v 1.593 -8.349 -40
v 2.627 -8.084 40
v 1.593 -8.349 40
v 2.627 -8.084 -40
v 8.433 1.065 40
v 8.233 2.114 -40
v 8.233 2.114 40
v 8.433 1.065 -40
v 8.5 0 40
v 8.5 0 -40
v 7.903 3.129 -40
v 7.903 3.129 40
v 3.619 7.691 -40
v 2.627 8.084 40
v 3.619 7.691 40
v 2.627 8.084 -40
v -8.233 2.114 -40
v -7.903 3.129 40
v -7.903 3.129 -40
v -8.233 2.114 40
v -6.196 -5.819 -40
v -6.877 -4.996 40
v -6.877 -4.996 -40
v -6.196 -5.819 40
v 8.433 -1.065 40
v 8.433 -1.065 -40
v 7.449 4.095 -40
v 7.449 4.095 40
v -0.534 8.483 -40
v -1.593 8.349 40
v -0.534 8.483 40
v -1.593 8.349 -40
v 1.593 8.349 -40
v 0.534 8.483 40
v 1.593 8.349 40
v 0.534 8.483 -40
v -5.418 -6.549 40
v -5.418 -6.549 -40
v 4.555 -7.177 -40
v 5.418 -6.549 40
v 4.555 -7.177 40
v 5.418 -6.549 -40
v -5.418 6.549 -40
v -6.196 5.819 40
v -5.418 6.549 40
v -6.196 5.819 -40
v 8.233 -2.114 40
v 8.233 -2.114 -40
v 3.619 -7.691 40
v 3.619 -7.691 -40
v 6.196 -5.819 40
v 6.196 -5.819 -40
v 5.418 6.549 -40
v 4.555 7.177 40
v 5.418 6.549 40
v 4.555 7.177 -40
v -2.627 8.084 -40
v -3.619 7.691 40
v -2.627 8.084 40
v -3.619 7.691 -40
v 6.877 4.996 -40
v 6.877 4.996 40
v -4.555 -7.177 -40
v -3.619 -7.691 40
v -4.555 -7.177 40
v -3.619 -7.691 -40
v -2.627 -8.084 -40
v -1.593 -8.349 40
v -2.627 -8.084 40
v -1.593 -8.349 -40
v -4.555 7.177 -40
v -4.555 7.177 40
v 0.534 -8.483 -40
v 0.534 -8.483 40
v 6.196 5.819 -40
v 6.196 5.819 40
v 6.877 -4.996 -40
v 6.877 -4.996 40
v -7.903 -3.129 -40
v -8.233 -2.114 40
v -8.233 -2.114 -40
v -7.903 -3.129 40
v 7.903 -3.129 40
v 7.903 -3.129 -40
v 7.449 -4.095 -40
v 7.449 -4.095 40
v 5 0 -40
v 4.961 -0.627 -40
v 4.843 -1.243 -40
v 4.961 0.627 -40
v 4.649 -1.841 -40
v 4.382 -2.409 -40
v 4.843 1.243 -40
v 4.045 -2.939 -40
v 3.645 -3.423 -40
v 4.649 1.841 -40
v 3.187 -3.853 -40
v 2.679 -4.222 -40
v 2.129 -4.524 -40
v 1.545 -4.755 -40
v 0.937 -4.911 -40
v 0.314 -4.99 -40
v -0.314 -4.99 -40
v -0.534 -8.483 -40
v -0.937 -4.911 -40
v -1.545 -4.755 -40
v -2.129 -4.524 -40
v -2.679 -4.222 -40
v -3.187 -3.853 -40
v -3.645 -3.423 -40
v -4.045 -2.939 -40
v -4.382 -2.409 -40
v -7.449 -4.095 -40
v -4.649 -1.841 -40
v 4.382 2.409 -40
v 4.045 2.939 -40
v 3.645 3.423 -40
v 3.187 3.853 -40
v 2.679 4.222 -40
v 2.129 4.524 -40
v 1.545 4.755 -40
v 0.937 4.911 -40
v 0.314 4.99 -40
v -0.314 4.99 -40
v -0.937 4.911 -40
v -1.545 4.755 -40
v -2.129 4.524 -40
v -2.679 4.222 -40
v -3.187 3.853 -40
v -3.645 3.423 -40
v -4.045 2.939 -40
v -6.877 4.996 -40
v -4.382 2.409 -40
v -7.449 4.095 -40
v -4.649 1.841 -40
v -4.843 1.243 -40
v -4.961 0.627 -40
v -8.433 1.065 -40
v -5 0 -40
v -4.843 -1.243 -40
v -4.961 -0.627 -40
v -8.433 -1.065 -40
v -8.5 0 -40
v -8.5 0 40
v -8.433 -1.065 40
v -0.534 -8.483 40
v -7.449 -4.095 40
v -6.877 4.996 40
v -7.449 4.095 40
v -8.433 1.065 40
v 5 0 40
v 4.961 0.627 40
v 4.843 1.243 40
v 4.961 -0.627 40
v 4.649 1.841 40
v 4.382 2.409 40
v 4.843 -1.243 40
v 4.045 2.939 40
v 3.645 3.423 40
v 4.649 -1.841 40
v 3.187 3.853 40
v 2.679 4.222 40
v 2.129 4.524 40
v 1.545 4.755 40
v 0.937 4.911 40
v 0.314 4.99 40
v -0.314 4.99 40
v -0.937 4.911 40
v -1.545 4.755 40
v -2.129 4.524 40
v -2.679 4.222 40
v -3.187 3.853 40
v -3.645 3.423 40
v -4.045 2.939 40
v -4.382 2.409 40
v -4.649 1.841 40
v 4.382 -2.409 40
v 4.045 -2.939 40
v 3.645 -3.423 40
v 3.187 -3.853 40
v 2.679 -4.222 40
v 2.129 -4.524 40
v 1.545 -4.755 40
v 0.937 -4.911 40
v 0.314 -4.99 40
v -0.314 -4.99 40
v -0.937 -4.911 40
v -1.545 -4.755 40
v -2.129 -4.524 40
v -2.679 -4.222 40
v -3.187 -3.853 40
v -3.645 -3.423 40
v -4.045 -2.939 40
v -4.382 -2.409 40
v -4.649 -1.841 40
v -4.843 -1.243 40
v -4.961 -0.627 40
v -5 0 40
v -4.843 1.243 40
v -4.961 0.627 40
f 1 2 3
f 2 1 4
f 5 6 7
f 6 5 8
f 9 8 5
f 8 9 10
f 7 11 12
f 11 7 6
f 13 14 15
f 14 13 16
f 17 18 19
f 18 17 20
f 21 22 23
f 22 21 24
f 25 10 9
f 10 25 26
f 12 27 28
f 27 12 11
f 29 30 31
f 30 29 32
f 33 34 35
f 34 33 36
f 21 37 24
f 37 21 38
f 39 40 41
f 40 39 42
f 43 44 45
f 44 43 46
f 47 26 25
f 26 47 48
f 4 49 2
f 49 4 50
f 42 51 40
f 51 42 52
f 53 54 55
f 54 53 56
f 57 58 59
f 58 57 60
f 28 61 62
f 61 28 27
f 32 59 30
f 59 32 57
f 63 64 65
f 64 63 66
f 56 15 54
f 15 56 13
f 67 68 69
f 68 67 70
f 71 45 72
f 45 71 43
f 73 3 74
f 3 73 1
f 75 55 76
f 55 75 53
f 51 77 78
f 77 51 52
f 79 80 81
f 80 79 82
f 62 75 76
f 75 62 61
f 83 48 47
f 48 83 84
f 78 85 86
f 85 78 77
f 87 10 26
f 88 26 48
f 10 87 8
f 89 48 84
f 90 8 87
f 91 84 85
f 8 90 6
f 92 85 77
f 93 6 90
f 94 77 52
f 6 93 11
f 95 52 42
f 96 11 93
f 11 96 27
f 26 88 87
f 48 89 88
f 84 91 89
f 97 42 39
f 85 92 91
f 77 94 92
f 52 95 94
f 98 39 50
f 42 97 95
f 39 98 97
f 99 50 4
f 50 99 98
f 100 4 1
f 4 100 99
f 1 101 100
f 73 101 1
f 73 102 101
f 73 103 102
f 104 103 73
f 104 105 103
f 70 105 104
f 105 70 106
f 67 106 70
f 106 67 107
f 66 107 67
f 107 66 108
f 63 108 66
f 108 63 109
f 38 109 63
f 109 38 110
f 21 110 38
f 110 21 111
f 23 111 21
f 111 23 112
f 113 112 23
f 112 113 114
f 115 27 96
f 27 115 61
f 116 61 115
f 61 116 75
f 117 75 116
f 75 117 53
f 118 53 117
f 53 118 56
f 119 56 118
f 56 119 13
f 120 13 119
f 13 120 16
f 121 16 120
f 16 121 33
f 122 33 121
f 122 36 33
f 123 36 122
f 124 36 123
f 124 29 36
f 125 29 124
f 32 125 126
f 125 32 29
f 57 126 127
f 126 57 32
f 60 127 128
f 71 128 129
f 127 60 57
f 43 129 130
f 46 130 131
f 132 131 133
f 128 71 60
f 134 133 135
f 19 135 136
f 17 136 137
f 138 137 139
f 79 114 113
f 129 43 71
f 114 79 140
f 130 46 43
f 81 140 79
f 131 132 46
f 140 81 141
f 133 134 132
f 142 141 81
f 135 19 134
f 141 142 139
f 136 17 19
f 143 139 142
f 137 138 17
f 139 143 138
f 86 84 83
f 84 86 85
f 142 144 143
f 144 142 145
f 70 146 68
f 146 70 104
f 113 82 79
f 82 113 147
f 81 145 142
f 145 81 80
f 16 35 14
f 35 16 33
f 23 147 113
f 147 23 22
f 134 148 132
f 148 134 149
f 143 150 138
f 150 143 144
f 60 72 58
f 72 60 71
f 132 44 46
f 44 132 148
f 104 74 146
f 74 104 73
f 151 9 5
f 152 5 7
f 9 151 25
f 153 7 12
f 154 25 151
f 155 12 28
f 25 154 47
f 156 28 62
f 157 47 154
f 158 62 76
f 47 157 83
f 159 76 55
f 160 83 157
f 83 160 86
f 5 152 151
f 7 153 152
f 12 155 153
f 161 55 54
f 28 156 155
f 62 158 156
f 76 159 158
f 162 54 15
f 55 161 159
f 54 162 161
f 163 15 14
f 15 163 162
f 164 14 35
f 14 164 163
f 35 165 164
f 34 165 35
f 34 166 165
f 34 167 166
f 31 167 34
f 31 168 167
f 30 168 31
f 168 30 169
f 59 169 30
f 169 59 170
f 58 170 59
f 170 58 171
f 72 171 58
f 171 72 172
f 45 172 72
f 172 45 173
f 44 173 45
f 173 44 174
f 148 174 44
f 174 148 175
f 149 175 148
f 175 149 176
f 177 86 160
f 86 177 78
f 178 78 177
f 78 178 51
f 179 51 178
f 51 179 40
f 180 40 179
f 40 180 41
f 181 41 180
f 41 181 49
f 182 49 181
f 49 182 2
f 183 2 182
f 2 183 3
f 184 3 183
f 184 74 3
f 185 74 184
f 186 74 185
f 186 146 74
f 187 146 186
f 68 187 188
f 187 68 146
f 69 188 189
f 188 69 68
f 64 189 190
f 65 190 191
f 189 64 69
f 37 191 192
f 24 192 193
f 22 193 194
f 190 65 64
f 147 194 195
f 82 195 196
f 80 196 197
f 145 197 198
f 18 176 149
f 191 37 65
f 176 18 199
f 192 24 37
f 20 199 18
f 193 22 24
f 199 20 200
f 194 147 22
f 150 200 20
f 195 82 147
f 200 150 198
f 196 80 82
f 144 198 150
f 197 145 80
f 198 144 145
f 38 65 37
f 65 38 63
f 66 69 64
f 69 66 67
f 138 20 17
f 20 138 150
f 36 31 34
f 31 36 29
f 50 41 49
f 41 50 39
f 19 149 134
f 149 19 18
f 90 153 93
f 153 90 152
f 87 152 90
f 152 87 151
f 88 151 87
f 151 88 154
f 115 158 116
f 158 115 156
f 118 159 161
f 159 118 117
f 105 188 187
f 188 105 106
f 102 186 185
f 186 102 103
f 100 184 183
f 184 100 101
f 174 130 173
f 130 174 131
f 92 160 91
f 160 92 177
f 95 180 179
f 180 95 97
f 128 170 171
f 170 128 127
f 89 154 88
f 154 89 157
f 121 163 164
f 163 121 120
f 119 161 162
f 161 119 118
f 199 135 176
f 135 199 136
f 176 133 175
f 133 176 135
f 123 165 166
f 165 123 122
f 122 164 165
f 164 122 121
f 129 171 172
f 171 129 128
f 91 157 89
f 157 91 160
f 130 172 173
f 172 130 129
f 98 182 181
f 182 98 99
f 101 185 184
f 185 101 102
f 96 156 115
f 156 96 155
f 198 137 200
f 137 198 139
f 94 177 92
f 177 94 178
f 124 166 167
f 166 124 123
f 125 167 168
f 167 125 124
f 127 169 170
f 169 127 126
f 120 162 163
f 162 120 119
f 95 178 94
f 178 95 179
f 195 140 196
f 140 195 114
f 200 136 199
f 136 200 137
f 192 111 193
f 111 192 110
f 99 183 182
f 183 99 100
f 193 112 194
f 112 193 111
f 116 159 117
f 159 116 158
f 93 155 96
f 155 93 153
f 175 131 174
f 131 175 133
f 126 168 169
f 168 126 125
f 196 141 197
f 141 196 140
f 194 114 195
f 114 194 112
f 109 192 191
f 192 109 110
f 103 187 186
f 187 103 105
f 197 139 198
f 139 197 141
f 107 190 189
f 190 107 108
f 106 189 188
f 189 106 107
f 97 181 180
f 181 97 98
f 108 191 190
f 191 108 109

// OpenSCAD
$fn = 50;


difference() {
	union() {
		translate(v = [0, 0, -40.0000000000]) {
			cylinder(h = 80, r = 8.5000000000);
		}
	}
	union() {
		translate(v = [0, 0, -100.0000000000]) {
			cylinder(h = 200, r = 5.0000000000);
		}
	}
}
